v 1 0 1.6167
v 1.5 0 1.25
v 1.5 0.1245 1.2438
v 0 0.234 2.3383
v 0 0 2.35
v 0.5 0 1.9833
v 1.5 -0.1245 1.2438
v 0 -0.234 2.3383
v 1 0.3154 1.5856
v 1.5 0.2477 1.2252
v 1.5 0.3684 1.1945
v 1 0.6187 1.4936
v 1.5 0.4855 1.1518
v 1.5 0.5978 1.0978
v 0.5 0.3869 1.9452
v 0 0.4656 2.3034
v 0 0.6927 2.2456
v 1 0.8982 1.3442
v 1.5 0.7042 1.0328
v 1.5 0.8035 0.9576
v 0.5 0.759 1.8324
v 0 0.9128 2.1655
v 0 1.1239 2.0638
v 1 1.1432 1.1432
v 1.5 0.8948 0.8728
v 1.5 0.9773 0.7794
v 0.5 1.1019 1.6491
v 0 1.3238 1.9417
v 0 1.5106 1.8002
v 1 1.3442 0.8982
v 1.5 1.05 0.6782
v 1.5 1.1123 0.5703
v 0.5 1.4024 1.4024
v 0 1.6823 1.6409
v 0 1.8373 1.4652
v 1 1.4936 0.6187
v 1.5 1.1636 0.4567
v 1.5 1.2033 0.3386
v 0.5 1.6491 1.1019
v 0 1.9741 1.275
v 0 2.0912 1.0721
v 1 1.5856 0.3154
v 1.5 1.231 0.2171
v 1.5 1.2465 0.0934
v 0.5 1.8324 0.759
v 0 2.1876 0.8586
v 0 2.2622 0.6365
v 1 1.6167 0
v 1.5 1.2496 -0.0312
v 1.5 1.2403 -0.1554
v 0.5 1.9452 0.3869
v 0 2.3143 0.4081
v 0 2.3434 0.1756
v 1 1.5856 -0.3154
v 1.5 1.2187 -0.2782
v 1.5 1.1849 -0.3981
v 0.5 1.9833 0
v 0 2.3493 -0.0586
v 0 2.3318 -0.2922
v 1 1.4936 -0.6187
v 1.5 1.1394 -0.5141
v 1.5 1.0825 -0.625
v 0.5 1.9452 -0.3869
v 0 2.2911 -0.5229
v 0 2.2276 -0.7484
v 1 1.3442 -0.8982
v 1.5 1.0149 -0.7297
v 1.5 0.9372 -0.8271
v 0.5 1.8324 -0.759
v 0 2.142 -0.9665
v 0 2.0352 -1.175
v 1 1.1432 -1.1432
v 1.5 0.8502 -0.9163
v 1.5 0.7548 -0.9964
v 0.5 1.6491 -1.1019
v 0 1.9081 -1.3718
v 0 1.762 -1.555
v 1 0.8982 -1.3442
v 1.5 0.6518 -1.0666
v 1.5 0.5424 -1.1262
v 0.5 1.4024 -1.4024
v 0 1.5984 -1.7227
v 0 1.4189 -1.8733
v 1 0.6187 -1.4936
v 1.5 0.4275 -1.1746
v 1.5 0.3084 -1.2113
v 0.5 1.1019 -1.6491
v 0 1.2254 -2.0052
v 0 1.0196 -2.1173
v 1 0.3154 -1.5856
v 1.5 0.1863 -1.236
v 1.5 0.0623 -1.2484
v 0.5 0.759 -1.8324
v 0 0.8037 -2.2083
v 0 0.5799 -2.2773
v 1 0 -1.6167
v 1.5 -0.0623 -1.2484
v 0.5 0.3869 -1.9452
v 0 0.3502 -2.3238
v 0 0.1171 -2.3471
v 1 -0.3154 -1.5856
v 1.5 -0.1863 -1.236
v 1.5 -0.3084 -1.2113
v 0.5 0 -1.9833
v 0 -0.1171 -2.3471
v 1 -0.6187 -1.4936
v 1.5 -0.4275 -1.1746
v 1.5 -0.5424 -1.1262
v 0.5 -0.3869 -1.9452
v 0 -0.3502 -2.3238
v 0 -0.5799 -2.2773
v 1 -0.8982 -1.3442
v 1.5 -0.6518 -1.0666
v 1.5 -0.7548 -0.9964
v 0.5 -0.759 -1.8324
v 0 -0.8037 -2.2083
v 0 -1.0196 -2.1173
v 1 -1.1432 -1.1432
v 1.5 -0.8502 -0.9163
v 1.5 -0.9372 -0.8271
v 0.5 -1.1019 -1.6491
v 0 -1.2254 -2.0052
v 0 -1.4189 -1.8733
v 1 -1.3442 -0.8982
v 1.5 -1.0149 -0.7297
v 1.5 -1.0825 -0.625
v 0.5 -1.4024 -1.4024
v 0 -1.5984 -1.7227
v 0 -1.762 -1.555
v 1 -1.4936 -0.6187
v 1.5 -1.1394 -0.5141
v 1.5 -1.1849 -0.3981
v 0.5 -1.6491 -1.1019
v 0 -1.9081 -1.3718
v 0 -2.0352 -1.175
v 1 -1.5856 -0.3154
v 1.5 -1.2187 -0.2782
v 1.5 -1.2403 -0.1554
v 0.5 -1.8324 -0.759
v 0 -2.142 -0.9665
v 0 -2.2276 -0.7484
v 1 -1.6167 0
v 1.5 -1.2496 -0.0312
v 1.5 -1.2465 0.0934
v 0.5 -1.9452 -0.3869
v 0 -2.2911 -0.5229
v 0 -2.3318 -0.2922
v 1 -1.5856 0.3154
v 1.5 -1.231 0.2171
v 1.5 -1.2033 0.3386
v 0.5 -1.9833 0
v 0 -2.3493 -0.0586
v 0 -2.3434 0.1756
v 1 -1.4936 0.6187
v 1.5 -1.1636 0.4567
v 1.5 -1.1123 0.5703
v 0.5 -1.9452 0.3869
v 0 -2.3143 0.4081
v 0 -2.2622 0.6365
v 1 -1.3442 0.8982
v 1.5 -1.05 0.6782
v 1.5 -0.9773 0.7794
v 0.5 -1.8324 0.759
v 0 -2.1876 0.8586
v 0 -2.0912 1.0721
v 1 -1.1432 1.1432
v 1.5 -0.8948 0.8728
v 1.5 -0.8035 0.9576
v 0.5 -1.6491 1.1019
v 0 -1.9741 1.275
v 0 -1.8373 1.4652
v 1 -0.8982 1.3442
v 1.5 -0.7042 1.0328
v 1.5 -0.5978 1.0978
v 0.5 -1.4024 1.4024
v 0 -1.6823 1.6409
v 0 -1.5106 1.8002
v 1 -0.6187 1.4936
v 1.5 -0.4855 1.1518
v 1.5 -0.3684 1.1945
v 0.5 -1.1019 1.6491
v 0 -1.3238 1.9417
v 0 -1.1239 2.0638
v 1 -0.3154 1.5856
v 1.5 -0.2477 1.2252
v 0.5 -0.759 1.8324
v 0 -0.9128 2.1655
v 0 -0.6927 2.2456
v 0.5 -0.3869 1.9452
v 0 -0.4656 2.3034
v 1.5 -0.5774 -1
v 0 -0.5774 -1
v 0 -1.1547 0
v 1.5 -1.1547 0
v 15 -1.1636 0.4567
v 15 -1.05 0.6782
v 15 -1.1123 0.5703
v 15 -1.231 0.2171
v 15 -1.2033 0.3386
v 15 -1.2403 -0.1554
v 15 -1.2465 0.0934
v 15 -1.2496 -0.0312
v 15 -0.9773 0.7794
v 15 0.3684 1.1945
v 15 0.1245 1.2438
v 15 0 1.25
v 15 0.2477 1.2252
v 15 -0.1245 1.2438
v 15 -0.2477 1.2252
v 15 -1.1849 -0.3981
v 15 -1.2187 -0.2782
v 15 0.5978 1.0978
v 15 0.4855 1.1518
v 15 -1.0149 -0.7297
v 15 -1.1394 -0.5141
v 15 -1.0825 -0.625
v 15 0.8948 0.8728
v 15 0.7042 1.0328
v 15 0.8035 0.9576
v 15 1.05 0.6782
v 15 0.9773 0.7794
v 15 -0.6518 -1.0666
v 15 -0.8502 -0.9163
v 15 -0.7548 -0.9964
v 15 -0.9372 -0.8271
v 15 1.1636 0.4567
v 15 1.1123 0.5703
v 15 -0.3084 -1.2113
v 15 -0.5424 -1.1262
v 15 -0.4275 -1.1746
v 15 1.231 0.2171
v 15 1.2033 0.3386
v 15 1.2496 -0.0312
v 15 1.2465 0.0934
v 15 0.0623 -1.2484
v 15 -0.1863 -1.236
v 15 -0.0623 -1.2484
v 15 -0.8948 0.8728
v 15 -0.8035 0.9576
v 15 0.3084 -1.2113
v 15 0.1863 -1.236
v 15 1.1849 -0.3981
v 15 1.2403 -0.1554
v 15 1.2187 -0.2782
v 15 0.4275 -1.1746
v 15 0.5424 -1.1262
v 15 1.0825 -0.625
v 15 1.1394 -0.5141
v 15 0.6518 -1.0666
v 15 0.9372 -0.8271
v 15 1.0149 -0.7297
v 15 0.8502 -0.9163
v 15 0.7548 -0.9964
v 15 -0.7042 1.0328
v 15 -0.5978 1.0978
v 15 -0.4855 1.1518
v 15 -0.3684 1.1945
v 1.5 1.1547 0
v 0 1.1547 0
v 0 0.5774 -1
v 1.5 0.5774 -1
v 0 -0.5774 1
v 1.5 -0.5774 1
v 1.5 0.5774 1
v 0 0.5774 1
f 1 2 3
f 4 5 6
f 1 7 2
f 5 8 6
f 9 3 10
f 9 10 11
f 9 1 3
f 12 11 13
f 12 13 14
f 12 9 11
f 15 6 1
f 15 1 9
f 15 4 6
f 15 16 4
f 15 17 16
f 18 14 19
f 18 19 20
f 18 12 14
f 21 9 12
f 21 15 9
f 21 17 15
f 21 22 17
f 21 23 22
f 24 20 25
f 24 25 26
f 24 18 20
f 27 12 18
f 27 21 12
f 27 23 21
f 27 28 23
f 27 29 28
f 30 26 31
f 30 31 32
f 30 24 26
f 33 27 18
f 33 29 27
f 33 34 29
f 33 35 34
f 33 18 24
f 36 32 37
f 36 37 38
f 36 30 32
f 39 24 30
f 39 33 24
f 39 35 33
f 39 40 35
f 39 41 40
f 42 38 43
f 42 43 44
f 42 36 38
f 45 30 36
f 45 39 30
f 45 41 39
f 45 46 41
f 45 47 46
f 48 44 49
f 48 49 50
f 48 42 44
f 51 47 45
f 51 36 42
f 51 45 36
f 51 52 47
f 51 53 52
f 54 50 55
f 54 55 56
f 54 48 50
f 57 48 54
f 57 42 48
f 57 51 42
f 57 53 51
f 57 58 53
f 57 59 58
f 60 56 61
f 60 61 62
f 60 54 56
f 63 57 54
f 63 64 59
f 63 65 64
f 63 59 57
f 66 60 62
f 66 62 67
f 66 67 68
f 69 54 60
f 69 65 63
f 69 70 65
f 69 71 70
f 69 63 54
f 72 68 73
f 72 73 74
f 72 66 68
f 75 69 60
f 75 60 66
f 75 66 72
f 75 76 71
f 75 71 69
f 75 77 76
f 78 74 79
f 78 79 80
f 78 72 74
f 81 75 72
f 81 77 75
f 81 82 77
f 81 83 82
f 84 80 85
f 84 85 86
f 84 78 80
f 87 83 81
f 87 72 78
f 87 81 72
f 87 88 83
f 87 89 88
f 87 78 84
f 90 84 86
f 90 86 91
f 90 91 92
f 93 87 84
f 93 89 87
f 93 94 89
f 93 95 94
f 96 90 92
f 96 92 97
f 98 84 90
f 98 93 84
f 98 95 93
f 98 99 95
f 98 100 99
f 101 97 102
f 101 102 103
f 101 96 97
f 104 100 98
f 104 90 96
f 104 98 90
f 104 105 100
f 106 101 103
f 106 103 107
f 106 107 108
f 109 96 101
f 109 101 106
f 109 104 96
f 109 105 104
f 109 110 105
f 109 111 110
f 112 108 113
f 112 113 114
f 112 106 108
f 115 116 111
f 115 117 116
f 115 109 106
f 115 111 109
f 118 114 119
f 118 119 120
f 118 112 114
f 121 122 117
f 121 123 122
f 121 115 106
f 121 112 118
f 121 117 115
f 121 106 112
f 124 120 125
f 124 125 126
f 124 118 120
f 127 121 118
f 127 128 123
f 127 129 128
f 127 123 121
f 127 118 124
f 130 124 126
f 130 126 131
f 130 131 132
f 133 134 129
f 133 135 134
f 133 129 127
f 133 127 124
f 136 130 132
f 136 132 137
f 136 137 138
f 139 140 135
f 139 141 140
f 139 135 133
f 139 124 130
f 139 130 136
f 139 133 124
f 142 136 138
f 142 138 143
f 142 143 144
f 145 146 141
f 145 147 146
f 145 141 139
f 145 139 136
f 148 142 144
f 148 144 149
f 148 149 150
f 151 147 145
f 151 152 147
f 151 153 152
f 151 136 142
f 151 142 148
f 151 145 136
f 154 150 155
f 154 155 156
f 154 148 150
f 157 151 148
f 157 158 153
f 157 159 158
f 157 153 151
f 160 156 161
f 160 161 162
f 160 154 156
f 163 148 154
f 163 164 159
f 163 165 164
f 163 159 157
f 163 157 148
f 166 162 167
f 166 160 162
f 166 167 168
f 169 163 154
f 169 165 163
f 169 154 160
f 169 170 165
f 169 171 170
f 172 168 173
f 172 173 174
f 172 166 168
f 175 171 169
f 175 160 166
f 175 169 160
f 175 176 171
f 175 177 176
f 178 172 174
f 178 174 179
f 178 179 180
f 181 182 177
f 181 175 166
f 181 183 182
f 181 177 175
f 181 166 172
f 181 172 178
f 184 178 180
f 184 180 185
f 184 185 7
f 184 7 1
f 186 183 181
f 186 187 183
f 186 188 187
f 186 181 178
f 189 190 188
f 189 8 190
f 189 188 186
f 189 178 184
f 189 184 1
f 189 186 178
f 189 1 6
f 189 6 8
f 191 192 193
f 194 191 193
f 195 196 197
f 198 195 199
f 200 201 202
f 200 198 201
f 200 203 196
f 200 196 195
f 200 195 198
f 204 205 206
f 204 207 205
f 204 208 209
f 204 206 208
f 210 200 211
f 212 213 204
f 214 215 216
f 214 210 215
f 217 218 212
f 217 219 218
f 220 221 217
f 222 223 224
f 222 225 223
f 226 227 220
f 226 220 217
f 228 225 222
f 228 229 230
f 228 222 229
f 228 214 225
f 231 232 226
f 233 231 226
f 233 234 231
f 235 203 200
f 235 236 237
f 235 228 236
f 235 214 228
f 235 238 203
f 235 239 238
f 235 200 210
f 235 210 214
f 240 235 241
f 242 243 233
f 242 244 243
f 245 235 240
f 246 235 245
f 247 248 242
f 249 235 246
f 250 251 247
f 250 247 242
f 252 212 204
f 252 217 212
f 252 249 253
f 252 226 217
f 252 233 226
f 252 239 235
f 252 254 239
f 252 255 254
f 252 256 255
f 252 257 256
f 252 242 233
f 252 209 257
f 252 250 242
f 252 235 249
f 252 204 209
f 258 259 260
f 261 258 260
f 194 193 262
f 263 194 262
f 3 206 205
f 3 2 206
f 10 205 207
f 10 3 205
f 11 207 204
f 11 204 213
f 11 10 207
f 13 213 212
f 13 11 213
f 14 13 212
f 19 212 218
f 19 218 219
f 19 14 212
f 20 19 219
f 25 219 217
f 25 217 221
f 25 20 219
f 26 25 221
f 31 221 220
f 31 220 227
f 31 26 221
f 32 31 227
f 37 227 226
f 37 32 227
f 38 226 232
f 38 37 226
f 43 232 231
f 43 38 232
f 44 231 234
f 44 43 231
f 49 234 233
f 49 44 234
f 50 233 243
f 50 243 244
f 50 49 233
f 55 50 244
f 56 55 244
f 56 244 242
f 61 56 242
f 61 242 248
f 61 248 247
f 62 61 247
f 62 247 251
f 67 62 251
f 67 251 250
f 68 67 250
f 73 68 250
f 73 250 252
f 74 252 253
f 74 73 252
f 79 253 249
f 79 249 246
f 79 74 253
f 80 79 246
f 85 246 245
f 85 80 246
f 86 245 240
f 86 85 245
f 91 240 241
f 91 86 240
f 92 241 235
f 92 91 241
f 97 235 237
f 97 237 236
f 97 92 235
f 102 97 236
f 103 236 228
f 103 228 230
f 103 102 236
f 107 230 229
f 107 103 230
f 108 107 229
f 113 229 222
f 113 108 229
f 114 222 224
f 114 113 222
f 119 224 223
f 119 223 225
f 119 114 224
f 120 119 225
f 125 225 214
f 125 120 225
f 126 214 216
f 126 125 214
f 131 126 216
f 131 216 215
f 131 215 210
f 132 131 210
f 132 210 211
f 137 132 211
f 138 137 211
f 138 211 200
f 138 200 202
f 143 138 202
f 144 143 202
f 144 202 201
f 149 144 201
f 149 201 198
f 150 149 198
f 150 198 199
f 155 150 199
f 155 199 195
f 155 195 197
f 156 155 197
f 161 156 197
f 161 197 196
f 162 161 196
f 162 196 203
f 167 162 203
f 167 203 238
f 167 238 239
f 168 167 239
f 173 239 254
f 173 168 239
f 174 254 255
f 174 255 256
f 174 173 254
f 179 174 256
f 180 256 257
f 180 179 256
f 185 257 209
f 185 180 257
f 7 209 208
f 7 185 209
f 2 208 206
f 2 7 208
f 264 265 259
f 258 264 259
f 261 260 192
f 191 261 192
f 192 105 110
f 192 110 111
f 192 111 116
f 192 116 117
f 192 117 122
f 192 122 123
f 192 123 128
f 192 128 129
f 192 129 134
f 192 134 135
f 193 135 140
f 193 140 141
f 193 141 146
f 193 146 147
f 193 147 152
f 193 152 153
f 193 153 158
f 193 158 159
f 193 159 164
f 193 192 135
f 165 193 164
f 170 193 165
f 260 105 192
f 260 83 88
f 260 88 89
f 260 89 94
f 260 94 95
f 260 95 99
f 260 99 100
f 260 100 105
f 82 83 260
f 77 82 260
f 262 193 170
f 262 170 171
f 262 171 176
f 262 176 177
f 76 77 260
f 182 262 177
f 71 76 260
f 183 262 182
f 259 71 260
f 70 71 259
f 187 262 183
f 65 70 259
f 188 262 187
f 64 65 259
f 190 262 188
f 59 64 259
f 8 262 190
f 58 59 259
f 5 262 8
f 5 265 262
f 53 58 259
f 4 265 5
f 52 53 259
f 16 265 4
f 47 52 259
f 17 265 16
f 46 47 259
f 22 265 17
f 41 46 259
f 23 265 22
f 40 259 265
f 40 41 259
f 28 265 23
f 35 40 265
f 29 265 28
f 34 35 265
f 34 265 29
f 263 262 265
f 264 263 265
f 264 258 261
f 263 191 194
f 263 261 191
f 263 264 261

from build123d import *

# Parameters (mm, degrees)
F3_DEPTH = 1.5


with BuildPart() as f1:
    # F0 (on Front) → F1 (revolve)
    with BuildSketch(Plane.XZ):
        Polygon((0, 2.35), (0, 0), (15, 0), (15, 1.25), (1.5, 1.25), align=None)
    revolve(axis=Axis((7.5, 0, 0), (-1, 0, 0)))

    # F2 (on face) → F3 (cut)
    with BuildSketch(Plane(origin=(0, 0, 0), x_dir=(0, -1, 0), z_dir=(-1, 0, 0))):
        Polygon((0.57735, -1), (1.154701, 0), (0.57735, 1), (-0.57735, 1), (-1.154701, 0), (-0.57735, -1), align=None)
    extrude(amount=-F3_DEPTH, mode=Mode.SUBTRACT)


solid = f1.part
